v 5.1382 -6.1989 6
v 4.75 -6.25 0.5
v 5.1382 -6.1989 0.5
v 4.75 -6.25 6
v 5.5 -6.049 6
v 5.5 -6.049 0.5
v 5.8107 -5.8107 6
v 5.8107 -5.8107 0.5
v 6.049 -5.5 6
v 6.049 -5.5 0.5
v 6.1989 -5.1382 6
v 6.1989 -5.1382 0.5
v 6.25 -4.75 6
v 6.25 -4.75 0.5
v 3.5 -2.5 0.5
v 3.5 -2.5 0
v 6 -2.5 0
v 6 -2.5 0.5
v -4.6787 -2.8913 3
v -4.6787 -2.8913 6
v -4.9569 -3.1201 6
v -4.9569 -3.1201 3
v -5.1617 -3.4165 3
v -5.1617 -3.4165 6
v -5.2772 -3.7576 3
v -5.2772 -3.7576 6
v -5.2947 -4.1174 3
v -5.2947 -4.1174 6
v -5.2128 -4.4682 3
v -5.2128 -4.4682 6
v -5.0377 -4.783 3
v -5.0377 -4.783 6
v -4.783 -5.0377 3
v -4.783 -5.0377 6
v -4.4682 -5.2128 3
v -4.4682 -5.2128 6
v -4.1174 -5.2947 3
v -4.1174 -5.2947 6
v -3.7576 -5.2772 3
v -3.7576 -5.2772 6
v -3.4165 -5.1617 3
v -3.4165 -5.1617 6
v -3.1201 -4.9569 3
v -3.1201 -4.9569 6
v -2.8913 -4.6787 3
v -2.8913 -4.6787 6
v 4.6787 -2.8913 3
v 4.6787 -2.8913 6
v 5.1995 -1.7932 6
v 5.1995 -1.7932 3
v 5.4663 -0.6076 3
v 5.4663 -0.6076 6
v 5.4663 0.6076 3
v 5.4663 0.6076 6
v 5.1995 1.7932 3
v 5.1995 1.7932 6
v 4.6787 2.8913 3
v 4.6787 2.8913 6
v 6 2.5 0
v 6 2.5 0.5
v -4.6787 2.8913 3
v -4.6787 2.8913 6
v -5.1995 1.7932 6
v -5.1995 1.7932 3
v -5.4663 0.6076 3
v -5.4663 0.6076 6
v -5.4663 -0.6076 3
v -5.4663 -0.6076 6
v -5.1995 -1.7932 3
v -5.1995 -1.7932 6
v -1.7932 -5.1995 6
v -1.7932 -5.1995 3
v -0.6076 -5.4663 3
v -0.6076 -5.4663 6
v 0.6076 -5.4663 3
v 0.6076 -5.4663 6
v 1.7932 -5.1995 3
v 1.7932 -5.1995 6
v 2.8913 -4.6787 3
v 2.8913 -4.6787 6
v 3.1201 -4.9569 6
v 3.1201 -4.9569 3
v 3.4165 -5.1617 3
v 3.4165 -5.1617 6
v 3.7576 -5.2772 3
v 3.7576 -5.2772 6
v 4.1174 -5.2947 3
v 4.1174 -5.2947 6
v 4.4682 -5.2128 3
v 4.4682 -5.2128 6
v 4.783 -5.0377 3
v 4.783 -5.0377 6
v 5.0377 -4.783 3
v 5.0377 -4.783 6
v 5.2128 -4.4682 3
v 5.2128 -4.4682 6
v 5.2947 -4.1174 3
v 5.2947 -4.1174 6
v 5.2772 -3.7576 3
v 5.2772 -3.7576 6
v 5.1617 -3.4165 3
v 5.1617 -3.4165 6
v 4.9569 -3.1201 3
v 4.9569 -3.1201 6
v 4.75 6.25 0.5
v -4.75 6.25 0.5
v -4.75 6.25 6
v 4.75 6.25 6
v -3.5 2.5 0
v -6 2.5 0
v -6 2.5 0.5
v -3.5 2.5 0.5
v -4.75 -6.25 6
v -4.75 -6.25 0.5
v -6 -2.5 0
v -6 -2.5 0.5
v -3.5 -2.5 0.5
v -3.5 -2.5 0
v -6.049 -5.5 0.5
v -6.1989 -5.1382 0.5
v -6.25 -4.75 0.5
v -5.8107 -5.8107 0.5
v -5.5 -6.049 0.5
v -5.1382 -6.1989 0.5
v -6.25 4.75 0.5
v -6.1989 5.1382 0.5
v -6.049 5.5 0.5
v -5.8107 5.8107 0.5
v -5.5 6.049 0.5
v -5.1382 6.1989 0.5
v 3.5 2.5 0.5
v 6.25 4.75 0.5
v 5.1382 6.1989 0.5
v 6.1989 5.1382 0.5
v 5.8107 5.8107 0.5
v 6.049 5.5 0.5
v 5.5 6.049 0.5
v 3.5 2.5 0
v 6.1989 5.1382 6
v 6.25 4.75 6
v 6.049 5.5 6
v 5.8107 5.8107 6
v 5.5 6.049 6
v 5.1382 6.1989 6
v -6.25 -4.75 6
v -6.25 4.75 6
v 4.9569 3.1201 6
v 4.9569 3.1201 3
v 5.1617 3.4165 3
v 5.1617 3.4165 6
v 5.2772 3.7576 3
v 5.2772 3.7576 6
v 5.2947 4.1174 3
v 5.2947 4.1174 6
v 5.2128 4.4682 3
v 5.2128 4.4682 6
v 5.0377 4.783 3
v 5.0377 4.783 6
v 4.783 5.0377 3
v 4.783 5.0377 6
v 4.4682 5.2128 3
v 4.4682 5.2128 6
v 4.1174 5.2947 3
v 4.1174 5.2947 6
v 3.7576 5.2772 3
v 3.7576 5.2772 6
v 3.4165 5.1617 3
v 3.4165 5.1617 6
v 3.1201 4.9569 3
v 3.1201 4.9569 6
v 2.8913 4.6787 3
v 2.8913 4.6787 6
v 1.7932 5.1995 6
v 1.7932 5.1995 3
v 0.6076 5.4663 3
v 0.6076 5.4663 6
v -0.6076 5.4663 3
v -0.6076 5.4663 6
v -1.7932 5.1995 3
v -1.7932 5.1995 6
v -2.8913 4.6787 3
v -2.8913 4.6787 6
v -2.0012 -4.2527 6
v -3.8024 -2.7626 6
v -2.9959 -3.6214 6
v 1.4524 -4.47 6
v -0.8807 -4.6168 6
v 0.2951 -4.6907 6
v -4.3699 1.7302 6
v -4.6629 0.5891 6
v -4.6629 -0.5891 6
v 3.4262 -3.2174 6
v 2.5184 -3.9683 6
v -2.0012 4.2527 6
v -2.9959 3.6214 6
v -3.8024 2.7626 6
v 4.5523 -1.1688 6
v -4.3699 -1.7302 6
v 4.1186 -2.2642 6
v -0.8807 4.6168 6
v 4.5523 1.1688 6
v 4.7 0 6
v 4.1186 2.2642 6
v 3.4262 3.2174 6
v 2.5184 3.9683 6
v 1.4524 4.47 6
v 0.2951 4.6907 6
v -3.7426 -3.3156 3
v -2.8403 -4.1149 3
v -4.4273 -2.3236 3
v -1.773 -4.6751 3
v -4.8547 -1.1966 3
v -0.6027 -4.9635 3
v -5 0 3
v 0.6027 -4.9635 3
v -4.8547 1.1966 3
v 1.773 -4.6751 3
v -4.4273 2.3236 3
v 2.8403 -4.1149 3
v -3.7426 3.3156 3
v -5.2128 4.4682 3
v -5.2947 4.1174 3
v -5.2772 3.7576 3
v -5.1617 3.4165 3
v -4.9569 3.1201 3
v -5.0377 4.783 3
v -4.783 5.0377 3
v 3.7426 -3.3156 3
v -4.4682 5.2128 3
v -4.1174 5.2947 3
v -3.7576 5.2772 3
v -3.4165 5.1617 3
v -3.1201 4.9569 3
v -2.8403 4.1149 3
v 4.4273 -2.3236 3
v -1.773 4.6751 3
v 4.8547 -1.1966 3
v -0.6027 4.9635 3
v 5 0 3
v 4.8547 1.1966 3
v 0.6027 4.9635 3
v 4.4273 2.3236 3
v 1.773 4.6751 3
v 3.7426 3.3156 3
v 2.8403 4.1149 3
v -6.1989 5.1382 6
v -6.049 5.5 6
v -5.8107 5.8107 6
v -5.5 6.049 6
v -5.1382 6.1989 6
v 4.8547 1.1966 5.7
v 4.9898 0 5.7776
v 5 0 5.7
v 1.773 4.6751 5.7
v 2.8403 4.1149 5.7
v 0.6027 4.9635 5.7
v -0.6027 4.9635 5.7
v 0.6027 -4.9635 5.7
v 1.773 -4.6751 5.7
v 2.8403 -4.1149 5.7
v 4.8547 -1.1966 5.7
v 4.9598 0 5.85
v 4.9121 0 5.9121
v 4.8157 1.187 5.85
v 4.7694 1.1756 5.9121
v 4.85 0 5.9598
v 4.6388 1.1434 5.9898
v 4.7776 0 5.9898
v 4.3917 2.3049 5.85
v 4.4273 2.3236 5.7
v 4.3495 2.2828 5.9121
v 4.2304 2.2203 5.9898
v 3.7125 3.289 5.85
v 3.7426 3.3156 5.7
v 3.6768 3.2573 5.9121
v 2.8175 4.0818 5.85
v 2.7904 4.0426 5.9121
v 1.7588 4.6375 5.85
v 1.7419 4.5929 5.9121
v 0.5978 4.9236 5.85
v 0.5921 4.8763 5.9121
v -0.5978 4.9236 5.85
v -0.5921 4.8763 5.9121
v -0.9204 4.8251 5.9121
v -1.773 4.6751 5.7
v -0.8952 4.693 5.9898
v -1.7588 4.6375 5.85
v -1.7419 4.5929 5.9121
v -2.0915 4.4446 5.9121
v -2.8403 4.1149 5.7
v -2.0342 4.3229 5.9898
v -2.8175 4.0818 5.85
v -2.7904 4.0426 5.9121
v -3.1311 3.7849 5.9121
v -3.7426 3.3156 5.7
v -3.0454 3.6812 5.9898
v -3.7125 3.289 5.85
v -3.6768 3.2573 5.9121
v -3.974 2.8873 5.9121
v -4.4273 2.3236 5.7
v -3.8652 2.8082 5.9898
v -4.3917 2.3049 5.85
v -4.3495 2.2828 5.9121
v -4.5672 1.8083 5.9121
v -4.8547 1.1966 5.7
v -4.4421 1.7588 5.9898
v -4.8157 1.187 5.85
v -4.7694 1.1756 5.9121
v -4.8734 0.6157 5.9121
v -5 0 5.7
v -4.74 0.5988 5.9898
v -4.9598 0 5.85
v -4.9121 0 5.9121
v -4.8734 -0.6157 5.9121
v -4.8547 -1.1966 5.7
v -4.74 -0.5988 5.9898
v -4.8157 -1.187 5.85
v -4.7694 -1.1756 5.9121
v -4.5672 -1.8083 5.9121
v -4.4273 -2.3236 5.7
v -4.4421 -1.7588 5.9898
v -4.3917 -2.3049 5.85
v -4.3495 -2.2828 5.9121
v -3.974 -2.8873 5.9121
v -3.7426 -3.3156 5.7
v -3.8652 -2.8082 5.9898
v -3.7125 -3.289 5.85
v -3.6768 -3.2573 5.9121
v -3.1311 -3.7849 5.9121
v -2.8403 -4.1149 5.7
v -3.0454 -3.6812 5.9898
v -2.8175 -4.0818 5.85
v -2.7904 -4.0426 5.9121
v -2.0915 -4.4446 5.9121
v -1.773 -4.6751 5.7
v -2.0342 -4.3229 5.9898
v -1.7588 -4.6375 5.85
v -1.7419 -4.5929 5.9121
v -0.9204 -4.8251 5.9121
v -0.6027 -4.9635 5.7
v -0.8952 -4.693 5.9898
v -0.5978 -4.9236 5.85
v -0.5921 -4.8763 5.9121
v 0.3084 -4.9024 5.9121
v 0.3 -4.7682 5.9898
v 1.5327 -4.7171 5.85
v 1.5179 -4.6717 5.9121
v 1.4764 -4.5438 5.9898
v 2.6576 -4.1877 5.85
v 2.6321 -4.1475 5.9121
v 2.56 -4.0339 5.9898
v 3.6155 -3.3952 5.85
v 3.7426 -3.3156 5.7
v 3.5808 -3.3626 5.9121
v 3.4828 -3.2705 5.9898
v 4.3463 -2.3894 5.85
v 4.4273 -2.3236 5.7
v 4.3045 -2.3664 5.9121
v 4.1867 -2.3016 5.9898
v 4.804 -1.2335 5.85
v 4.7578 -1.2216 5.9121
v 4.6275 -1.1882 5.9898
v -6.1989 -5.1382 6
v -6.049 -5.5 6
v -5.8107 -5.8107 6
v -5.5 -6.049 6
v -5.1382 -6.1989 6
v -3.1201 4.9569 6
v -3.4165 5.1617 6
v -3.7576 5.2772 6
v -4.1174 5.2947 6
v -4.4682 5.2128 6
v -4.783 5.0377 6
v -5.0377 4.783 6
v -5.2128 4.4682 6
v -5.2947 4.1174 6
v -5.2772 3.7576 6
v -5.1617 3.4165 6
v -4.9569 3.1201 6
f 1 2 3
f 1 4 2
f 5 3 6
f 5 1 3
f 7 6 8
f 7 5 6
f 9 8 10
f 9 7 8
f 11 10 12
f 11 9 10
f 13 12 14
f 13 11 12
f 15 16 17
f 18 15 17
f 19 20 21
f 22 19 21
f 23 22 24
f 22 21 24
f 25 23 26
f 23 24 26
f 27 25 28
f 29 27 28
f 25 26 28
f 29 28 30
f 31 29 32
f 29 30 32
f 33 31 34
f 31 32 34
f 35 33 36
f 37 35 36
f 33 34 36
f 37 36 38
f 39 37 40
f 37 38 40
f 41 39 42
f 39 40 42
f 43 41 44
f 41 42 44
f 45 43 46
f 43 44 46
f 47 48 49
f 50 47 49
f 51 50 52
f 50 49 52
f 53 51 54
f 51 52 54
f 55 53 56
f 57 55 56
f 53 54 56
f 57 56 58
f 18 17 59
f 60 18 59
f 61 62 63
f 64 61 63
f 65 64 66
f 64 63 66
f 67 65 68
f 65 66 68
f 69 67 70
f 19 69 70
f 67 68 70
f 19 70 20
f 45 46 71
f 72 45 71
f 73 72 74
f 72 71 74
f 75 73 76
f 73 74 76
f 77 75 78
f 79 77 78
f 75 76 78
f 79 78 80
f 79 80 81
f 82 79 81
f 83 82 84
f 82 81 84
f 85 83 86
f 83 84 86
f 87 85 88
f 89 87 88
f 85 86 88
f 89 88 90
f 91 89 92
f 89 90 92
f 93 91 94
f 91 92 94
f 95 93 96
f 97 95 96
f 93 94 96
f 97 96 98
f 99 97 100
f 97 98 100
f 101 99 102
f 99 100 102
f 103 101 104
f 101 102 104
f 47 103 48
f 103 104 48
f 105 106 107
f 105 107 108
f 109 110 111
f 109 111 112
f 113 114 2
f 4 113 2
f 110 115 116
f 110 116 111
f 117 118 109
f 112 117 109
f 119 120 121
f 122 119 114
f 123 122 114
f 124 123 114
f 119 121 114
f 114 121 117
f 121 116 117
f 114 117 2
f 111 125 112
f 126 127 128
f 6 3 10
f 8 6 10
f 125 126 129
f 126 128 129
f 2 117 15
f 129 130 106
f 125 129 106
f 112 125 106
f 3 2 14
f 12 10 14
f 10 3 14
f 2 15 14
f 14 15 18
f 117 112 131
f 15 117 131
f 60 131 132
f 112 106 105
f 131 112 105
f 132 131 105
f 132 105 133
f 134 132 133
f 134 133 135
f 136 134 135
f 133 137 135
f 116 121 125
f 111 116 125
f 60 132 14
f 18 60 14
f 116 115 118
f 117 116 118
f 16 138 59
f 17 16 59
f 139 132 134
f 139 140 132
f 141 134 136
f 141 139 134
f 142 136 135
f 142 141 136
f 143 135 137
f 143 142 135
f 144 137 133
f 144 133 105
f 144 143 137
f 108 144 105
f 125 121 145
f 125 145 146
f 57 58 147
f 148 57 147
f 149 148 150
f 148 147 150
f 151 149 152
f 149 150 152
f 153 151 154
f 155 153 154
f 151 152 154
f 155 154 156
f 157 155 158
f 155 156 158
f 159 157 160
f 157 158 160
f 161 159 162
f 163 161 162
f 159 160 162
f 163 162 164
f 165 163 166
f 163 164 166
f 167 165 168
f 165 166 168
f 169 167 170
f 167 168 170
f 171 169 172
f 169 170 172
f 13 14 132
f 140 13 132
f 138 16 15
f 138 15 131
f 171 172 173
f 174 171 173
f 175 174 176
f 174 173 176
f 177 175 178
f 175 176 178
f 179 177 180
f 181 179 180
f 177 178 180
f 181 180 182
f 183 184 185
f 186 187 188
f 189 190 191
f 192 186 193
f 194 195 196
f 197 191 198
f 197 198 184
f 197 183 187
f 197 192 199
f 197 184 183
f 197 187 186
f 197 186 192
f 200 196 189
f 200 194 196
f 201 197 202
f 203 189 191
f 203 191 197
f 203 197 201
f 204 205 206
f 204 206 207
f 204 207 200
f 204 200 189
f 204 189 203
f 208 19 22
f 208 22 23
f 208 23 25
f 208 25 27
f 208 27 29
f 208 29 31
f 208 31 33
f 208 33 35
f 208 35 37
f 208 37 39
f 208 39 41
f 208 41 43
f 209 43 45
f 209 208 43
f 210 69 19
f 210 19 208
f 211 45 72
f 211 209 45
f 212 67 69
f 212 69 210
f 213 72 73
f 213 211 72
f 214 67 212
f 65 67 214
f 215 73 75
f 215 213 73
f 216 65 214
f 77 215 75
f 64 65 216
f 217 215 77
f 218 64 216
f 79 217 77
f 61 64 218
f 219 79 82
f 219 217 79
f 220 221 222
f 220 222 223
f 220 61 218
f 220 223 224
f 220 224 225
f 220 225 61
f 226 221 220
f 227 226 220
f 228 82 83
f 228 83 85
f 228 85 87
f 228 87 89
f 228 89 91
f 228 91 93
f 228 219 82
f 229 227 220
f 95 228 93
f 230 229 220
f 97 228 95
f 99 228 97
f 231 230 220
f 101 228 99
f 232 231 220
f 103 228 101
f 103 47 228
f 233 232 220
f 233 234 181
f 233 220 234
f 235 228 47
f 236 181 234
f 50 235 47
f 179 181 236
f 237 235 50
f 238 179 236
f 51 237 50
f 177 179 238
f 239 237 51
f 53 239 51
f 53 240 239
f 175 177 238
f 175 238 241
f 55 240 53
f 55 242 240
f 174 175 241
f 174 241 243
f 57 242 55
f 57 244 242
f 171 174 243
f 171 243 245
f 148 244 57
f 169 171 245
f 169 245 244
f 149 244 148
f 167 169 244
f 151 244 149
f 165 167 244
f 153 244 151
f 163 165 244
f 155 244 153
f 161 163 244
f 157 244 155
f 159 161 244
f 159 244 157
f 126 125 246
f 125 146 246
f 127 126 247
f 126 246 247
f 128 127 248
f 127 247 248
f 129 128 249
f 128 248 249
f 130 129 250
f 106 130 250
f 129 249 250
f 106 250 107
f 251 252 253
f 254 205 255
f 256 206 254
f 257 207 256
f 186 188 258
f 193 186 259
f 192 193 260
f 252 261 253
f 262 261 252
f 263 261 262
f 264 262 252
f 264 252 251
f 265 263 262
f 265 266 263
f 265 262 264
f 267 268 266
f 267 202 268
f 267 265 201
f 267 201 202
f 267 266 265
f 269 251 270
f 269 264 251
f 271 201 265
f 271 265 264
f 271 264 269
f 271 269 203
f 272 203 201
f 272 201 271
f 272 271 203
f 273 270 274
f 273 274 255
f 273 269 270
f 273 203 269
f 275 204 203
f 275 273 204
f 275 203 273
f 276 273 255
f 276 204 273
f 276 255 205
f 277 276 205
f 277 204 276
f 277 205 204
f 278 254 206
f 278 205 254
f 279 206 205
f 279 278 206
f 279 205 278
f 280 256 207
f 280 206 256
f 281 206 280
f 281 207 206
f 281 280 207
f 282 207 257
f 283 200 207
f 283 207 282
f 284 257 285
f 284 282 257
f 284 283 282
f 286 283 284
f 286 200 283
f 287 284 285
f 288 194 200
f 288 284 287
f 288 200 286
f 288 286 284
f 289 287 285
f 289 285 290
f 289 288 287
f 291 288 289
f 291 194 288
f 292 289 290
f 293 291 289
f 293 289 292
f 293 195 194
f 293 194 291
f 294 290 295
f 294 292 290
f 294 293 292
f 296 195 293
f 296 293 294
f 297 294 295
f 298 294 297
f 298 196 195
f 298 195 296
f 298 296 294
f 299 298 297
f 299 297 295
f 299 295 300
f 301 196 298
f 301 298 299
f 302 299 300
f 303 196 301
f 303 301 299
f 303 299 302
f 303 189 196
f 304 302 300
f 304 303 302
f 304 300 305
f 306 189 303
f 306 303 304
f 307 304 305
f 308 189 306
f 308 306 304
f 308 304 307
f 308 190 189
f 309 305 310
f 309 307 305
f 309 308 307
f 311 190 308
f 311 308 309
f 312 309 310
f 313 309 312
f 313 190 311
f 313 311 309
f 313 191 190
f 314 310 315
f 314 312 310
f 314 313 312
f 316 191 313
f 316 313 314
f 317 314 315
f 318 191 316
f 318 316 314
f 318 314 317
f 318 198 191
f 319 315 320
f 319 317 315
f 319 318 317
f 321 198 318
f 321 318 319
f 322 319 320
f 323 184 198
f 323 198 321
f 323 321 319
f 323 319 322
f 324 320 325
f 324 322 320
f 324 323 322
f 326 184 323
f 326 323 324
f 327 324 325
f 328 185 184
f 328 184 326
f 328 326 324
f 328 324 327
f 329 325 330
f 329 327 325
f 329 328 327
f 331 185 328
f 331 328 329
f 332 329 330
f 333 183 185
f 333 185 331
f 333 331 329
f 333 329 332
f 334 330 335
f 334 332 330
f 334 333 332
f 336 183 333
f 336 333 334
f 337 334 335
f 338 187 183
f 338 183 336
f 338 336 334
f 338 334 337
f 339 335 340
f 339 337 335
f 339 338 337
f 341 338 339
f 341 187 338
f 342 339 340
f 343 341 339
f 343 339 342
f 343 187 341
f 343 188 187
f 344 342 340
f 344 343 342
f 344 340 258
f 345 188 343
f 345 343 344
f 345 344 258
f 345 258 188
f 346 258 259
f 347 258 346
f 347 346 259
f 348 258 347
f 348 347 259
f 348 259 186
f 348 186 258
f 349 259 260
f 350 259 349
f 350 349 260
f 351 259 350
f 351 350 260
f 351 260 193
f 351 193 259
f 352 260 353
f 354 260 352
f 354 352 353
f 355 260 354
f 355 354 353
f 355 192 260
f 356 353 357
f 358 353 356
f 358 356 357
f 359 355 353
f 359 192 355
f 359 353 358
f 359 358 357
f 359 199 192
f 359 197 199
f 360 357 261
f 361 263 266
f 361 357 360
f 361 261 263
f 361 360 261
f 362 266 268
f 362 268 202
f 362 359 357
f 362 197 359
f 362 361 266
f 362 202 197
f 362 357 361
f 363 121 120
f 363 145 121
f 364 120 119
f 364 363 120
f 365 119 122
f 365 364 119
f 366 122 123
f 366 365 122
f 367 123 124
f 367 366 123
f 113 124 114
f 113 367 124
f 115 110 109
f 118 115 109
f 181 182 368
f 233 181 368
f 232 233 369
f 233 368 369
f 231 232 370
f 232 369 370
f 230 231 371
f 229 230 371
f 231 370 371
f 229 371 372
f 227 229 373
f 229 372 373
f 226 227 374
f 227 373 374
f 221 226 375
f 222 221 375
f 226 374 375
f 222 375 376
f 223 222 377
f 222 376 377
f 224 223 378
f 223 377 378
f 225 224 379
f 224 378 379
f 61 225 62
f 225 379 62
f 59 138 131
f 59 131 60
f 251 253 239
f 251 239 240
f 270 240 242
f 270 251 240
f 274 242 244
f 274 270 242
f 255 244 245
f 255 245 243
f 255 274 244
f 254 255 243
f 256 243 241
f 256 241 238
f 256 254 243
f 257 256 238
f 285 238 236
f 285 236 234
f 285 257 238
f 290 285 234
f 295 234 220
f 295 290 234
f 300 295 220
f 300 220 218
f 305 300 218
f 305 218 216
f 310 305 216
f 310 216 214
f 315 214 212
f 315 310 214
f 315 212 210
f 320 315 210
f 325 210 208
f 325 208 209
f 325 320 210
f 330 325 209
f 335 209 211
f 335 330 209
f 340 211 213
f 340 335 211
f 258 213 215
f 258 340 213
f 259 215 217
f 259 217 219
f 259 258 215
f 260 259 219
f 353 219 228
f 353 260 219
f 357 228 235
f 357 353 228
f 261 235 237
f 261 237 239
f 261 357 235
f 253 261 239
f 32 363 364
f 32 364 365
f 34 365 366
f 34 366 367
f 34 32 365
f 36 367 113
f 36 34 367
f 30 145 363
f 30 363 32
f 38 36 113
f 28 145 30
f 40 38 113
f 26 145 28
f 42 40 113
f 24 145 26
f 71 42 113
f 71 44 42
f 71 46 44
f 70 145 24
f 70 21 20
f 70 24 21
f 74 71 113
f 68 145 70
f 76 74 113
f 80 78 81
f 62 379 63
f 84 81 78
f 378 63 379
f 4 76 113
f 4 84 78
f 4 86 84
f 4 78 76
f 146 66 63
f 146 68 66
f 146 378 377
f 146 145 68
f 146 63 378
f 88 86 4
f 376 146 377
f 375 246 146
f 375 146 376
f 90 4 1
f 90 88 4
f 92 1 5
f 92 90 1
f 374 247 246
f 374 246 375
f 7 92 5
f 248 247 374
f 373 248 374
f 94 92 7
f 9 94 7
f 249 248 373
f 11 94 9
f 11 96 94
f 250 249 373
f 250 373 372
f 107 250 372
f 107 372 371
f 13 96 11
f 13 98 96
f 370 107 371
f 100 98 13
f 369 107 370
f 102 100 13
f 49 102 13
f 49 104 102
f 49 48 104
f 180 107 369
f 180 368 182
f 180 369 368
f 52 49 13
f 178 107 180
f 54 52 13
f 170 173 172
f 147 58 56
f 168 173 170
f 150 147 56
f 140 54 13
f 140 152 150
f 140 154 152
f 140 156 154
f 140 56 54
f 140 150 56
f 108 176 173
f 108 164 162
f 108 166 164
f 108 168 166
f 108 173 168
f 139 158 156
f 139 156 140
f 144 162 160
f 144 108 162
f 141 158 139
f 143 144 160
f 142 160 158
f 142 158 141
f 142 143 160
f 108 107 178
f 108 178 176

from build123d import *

# Parameters (mm, degrees)
SKETCH001_W  = 2.5
SKETCH001_H  = 5
PAD001_DEPTH = 0.5
SKETCH002_W  = 2.5
SKETCH002_H  = 5
PAD002_DEPTH = 0.5
SKETCH_W     = 12.5
SKETCH_H     = 12.5
PAD_DEPTH    = 5.5
FILLET_R     = 1.5
SKETCH003_R  = 5
POCKET_DEPTH = 3
FILLET001_R  = 0.3


with BuildPart() as body001:
    # Sketch001 → Pad001 (new body)
    with BuildSketch(Plane.XY):
        with Locations((-4.75, 0)):
            Rectangle(SKETCH001_W, SKETCH001_H)
    extrude(amount=PAD001_DEPTH)


with BuildPart() as body002:
    # Sketch002 → Pad002 (new body)
    with BuildSketch(Plane.XY):
        with Locations((4.75, 0)):
            Rectangle(SKETCH002_W, SKETCH002_H)
    extrude(amount=PAD002_DEPTH)


with BuildPart() as fusion:
    # Sketch → Pad (new body)
    with BuildSketch(Plane.XY):
        Rectangle(SKETCH_W, SKETCH_H)
    extrude(amount=PAD_DEPTH)

    # Fillet
    fillet_edges = [fusion.edges().sort_by_distance(p)[0] for p in [
        (-6.25, -6.25, 2.75),
        (6.25, -6.25, 2.75),
        (-6.25, 6.25, 2.75),
        (6.25, 6.25, 2.75),
    ]]
    fillet(fillet_edges, radius=FILLET_R)

    # Sketch003 (on Face5 of Fillet) → Pocket (cut)
    with BuildSketch(Plane.XY.offset(5.5)):
        with BuildLine():
            ThreePointArc((-4.678742, 2.891258), (-5.5, 0), (-4.678742, -2.891258))
            ThreePointArc((-4.678742, -2.891258), (-4.919239, -4.919239), (-2.891258, -4.678742))
            ThreePointArc((-2.891258, -4.678742), (0, -5.5), (2.891258, -4.678742))
            ThreePointArc((2.891258, -4.678742), (4.919239, -4.919239), (4.678742, -2.891258))
            ThreePointArc((4.678742, -2.891258), (5.5, 0), (4.678742, 2.891258))
            ThreePointArc((4.678742, 2.891258), (4.919239, 4.919239), (2.891258, 4.678742))
            ThreePointArc((2.891258, 4.678742), (0, 5.5), (-2.891258, 4.678742))
            ThreePointArc((-2.891258, 4.678742), (-4.919239, 4.919239), (-4.678742, 2.891258))
        make_face()
        Circle(SKETCH003_R, mode=Mode.SUBTRACT)
    extrude(amount=-POCKET_DEPTH, mode=Mode.SUBTRACT)

    # Fillet001
    fillet001_edges = [fusion.edges().sort_by_distance(p)[0] for p in [
        (-5, 0, 5.5),
    ]]
    fillet(fillet001_edges, radius=FILLET001_R)


with BuildPart() as fusion_1:
    # Body placement: moved
    add(fusion.part.moved(Location((0, 0, 0.5))))

    # Fusion: union Body001, Body002
    add(body001.part)
    add(body002.part)


solid = fusion_1.part
